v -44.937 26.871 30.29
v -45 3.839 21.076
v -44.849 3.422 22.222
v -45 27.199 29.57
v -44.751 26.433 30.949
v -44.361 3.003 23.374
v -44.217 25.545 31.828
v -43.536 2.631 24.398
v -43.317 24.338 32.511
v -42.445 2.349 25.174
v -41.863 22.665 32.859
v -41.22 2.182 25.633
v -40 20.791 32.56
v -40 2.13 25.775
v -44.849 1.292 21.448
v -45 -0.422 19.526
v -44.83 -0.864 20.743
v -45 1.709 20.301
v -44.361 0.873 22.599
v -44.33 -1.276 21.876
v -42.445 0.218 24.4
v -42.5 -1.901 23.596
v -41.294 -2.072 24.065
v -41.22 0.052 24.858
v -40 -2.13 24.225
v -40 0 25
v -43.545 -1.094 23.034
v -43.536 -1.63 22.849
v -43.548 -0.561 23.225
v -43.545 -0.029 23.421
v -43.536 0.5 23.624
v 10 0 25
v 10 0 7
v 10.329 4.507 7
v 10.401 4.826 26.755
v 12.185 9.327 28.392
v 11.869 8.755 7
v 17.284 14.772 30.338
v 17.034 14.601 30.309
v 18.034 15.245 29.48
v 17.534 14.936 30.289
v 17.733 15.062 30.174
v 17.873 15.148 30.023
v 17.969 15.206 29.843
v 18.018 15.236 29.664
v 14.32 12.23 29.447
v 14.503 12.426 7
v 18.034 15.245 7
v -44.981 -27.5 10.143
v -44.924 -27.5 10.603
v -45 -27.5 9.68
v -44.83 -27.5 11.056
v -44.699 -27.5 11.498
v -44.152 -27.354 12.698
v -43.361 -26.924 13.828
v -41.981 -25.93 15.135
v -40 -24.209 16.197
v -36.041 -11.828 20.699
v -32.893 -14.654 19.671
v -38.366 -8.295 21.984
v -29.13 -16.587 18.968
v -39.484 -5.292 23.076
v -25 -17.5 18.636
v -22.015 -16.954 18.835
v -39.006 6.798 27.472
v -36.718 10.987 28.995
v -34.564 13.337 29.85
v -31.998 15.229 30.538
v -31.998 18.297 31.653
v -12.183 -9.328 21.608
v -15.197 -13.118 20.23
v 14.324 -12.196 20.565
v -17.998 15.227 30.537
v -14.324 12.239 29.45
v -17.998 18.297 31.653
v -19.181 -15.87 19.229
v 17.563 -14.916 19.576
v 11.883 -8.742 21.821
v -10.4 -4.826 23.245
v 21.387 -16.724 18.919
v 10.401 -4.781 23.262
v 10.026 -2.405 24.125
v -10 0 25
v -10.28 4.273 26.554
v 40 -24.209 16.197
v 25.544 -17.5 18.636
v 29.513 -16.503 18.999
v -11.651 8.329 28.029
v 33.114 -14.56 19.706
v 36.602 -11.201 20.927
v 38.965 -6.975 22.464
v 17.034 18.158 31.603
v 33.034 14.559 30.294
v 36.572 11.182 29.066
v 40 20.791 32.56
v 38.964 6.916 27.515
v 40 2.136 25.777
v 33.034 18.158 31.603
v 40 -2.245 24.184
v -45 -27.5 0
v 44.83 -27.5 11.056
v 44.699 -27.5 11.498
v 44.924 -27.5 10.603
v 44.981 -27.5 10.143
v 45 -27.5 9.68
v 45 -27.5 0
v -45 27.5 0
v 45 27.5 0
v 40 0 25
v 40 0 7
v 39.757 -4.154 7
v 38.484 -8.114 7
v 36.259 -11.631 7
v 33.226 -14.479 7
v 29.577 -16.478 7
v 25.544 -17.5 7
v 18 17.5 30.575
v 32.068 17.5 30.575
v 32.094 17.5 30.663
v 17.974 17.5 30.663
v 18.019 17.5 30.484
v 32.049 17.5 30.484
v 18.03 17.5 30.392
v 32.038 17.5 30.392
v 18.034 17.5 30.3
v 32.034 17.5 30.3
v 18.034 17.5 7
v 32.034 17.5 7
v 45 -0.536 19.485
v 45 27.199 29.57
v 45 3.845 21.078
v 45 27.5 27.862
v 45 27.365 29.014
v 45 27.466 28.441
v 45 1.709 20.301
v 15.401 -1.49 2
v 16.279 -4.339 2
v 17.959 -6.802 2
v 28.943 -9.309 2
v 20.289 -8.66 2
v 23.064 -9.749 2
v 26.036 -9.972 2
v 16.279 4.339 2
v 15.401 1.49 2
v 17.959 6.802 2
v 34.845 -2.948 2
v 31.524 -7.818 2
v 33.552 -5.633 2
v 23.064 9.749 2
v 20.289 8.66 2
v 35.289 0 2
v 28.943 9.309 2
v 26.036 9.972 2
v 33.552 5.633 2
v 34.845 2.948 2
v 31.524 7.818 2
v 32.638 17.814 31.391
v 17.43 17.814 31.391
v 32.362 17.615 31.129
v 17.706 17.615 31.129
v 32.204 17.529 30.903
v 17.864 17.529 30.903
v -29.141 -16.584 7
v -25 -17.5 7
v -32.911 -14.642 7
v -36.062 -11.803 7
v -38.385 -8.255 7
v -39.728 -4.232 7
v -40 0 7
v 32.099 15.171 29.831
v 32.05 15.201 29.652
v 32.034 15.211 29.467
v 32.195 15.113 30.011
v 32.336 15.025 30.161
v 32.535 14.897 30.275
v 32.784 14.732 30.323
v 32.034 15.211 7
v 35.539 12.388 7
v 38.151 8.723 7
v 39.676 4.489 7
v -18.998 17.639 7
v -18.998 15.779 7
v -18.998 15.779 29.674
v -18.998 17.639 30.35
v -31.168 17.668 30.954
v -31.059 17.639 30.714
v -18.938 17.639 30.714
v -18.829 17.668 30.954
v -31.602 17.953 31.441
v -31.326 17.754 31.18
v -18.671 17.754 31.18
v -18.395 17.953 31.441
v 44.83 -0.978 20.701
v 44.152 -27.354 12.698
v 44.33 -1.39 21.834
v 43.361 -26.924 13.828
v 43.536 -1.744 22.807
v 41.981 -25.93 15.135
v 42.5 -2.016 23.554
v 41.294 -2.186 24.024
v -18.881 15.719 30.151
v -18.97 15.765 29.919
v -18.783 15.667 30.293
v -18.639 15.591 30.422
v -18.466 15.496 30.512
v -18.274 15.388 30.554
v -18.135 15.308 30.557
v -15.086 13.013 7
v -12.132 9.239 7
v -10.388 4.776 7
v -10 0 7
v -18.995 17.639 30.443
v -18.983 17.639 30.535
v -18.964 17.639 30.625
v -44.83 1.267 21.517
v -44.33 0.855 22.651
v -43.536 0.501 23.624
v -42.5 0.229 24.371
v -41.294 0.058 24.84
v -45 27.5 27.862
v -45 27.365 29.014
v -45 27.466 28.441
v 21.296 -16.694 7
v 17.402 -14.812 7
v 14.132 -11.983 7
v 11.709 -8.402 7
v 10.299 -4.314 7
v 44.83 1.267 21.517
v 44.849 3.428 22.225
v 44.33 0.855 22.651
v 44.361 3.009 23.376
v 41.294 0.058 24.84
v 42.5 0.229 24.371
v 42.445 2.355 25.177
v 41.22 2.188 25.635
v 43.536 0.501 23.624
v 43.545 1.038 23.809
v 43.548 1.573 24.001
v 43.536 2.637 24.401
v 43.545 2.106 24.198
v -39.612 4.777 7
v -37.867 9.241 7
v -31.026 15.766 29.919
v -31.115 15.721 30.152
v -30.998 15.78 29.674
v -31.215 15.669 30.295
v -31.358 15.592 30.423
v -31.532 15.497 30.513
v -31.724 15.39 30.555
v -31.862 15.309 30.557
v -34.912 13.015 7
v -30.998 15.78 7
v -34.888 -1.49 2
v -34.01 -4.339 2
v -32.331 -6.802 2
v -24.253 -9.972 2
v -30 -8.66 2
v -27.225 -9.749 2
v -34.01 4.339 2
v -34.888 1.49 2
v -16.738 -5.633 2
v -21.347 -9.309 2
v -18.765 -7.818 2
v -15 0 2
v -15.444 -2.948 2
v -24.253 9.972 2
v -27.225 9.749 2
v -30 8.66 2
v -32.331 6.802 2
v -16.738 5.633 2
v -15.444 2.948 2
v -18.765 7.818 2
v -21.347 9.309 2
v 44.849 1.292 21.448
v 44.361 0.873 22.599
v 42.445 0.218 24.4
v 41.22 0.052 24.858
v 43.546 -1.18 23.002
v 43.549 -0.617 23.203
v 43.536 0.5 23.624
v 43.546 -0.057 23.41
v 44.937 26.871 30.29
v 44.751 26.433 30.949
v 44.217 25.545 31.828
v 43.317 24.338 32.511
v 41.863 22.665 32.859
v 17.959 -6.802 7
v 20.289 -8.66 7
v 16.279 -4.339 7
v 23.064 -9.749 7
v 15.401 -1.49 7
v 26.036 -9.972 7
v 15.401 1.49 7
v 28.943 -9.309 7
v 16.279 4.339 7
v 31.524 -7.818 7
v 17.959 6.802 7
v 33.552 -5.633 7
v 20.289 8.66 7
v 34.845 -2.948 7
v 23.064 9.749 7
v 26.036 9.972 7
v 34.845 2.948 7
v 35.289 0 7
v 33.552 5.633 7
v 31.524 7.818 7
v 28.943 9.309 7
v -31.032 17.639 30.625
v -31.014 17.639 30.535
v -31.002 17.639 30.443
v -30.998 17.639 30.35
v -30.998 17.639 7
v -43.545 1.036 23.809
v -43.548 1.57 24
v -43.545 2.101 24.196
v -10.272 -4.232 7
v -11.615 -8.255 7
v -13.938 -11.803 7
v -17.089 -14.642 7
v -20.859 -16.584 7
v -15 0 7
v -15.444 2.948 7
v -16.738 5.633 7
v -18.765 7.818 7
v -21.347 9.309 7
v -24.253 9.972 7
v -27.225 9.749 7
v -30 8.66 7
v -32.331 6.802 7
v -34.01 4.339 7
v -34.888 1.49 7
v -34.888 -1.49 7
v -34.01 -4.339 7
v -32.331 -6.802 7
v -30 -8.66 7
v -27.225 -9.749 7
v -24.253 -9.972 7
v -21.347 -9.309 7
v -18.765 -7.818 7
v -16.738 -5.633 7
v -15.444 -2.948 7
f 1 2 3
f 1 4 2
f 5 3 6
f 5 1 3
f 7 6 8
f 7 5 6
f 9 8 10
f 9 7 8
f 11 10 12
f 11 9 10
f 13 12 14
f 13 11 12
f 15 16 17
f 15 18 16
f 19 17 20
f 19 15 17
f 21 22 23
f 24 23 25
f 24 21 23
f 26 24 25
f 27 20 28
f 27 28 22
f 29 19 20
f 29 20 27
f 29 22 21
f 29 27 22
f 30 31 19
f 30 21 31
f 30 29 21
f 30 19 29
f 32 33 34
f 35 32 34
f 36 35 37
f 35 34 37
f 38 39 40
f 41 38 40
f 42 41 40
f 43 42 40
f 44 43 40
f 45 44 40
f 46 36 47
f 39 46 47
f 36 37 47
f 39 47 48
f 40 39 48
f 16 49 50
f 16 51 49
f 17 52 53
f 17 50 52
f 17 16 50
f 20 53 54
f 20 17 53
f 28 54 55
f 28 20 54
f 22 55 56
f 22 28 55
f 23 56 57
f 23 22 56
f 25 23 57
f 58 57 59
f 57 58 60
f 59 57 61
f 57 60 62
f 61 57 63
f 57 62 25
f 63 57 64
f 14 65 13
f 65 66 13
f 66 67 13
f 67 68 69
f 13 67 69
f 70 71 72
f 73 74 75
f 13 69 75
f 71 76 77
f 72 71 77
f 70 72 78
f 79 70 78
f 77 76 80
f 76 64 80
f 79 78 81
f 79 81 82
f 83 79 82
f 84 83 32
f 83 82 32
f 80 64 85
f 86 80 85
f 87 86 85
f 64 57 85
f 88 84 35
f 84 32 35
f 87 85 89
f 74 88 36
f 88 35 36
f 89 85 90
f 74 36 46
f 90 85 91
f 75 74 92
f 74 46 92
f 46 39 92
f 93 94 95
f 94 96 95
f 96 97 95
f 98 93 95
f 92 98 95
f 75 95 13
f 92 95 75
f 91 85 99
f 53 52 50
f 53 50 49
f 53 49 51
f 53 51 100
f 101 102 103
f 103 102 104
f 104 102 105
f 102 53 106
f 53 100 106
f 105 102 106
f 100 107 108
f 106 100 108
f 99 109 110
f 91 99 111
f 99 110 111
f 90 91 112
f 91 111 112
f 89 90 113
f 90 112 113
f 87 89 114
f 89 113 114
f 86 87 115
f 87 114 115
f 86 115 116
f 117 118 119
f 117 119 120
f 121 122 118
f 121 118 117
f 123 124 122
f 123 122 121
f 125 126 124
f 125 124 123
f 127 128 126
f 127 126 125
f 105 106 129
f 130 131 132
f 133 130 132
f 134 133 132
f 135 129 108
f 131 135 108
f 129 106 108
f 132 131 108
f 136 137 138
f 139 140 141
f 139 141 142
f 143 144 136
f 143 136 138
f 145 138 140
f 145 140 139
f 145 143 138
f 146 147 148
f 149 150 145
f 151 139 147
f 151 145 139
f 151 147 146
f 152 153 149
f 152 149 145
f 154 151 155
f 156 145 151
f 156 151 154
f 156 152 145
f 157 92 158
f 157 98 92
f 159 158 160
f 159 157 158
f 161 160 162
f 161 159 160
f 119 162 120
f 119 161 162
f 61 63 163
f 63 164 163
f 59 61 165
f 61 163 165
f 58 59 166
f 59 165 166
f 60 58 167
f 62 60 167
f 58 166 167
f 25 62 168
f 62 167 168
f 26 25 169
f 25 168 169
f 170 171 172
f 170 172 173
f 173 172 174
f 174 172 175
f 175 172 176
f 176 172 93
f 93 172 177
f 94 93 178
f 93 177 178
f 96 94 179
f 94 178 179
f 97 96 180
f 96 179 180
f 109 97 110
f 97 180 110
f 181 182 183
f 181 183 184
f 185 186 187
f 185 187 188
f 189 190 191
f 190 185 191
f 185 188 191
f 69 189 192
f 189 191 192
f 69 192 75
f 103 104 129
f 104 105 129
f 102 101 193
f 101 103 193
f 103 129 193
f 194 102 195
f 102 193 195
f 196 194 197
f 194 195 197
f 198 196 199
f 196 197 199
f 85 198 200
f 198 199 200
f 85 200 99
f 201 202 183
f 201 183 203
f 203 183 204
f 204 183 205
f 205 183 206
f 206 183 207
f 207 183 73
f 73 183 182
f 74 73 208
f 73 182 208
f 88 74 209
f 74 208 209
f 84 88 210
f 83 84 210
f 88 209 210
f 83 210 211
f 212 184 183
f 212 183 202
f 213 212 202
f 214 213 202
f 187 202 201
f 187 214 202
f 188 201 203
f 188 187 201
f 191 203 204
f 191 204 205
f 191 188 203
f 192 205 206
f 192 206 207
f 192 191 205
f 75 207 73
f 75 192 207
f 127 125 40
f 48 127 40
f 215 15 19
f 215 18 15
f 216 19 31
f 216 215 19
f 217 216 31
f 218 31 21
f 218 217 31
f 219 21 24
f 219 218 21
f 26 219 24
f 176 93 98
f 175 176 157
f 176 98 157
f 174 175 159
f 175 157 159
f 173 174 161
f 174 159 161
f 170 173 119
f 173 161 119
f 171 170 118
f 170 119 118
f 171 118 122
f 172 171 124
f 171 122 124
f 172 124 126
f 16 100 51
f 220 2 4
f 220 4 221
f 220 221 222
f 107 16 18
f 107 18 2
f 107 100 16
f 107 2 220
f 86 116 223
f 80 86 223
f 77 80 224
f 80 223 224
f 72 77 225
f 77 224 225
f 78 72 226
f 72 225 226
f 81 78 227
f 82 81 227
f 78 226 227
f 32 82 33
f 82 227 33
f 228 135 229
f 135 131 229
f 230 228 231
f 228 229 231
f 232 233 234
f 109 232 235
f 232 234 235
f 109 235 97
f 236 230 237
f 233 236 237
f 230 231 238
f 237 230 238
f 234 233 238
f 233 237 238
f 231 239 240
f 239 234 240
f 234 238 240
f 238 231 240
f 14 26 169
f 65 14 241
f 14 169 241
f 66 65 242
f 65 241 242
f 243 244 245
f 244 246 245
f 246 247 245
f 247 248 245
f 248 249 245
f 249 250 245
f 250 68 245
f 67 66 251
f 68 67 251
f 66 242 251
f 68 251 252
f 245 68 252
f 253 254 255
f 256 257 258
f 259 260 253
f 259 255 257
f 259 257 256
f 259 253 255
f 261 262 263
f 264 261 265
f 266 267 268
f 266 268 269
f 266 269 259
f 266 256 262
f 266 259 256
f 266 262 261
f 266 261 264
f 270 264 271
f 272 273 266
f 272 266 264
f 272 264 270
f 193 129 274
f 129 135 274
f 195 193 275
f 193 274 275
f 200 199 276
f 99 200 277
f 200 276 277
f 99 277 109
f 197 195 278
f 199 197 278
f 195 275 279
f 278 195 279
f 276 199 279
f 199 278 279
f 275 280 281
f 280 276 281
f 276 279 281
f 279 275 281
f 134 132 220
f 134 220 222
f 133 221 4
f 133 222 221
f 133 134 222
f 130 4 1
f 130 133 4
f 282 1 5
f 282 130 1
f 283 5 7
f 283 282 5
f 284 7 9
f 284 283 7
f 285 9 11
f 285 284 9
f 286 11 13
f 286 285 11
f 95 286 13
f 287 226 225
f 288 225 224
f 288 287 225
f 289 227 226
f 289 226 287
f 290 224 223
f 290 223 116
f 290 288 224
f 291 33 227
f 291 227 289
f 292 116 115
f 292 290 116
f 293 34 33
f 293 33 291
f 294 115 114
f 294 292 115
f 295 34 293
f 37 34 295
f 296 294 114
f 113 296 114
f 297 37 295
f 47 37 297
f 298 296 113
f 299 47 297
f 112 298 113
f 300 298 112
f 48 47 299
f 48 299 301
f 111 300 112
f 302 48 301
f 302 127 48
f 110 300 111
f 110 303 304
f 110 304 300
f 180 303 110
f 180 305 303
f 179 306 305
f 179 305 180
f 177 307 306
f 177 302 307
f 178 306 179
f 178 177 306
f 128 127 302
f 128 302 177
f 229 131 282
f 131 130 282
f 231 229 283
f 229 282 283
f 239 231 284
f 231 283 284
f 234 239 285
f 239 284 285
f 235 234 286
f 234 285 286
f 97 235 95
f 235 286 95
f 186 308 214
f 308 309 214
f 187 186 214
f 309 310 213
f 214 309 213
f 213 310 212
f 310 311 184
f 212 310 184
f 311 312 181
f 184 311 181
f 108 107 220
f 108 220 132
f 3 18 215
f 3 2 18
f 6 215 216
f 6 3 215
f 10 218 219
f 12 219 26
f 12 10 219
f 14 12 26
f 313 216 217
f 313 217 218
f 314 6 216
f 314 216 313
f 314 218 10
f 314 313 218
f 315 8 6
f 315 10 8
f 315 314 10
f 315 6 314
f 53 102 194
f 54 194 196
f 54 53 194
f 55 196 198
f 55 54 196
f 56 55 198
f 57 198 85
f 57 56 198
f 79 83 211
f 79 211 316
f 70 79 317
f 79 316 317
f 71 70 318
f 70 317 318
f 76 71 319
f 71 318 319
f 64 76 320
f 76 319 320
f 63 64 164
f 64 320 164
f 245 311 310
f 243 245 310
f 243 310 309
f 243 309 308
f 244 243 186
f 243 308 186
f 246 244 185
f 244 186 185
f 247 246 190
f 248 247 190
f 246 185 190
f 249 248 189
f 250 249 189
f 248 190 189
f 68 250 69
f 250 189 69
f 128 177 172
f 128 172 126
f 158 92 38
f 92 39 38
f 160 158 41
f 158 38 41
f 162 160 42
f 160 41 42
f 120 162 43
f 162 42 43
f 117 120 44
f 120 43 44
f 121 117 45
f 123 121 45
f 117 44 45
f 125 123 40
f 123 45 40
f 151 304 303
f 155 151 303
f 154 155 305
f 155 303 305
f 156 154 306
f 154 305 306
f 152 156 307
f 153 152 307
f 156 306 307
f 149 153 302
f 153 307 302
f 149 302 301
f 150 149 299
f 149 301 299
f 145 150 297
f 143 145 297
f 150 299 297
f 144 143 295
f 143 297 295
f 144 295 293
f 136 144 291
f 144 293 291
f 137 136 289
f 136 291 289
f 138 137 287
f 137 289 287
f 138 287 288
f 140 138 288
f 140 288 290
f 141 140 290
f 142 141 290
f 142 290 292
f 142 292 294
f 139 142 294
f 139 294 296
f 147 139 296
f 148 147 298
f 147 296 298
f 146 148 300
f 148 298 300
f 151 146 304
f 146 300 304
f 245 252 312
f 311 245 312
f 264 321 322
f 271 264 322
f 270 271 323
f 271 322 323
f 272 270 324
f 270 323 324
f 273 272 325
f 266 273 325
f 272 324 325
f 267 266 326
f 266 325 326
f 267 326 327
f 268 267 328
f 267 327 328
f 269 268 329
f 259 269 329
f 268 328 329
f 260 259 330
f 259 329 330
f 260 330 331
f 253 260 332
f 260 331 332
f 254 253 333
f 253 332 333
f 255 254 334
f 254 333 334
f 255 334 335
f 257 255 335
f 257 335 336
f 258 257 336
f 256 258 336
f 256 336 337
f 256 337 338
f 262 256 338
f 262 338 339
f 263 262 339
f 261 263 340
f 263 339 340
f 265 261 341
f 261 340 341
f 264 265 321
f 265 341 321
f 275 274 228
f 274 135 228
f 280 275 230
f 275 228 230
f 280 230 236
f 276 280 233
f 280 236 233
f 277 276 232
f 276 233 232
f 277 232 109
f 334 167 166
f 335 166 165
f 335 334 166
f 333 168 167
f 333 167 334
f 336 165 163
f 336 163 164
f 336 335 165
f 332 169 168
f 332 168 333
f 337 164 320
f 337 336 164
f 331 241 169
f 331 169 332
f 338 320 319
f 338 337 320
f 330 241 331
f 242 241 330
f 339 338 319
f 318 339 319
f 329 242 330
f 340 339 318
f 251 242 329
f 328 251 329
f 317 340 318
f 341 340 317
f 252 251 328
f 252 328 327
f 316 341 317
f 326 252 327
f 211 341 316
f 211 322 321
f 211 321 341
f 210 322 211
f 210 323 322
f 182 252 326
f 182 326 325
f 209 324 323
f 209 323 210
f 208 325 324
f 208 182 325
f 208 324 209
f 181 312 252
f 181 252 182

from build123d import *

# Parameters (mm, degrees)
F0_W     = 90
F0_H     = 55
F1_DEPTH = 35
F2_DEPTH = 7
F3_R     = 10
F4_DEPTH = 5
F6_DEPTH = 90
F7_R     = 4.99999
F8_W     = 12
F8_H     = 3
F9_DEPTH = 30.7
F10_R    = 1


# Not quite as in the source:
# - a fillet or chamfer is up to 0.001 mm smaller than in the source, because OpenCascade refuses the exact size
# - a feature names something its author has since deleted; it is built from what else it names


with BuildPart() as f1:
    # F0 (on Top) → F1 (new body)
    with BuildSketch(Plane.XY):
        Rectangle(F0_W, F0_H)
        with BuildLine():
            ThreePointArc((-40, 0), (-36.0621543344, 11.8032751438), (-25, 17.5))
            ThreePointArc((-25, 17.5), (-13.9378456656, 11.8032751438), (-10, 0))
            ThreePointArc((-10, 0), (-13.9378456656, -11.8032751438), (-25, -17.5))
            ThreePointArc((-25, -17.5), (-36.0621543344, -11.8032751438), (-40, 0))
        make_face(mode=Mode.SUBTRACT)
        with BuildLine():
            ThreePointArc((10, 0), (13.9500894873, 11.8143319509), (25.0340790777, 17.5))
            ThreePointArc((25.0340790777, 17.5), (36.0744106495, 11.7922476991), (40, 0))
            ThreePointArc((40, 0), (36.2593265414, -11.6306402206), (25.5441482581, -17.5))
            ThreePointArc((25.5441482581, -17.5), (14.1318309156, -11.9833988689), (10, 0))
        make_face(mode=Mode.SUBTRACT)
    extrude(amount=F1_DEPTH)

    # F0 (on Top) → F2 (join)
    with BuildSketch(Plane.XY):
        with BuildLine():
            ThreePointArc((-10, 0), (-13.9378456656, 11.8032751438), (-25, 17.5))
            ThreePointArc((-25, 17.5), (-36.0621543344, 11.8032751438), (-40, 0))
            ThreePointArc((-40, 0), (-36.0621543344, -11.8032751438), (-25, -17.5))
            ThreePointArc((-25, -17.5), (-13.9378456656, -11.8032751438), (-10, 0))
        make_face()
        with BuildLine():
            ThreePointArc((40, 0), (36.0744106495, 11.7922476991), (25.0340790777, 17.5))
            ThreePointArc((25.0340790777, 17.5), (13.9500894873, 11.8143319509), (10, 0))
            ThreePointArc((10, 0), (14.1318309156, -11.9833988689), (25.5441482581, -17.5))
            ThreePointArc((25.5441482581, -17.5), (36.2593265414, -11.6306402206), (40, 0))
        make_face()
    extrude(amount=F2_DEPTH)

    # F3 (on face) → F4 (cut)
    with BuildSketch(Plane.XY.offset(7)):
        with Locations((-25, 0)):
            Circle(F3_R)
        with Locations((25.2891136679, 0)):
            Circle(F3_R)
    extrude(amount=-F4_DEPTH, mode=Mode.SUBTRACT)

    # F5 (on face) → F6 (cut)
    with BuildSketch(Plane.YZ.offset(45)):
        Polygon((-27.5, 15), (27.5, 35), (-27.5, 35), align=None)
    extrude(amount=-F6_DEPTH, mode=Mode.SUBTRACT)

    # F7 (radius 5 in the source; OpenCascade refuses exactly that, so slightly less here)
    f7_edges = [f1.edges().sort_by_distance(p)[0] for p in [
        (0, 27.5, 35),
        (-45, 0, 25),
        (0, -27.5, 15),
        (45, 0, 25),
    ]]
    fillet(f7_edges, radius=F7_R)

    # F8 (on face) → F9 (cut)
    with BuildSketch(Plane.XY.offset(7)):
        with Locations((-24.9983986142, 16.138614808)):
            Rectangle(F8_W, F8_H)
        Polygon((32.0340790777, 17.5), (25.0340790777, 17.5), (18.0340790777, 17.5), (18.0340790777, 14.5), (32.0340790777, 14.5), align=None)
    extrude(amount=F9_DEPTH, mode=Mode.SUBTRACT)

    # F10
    f10_edges = [f1.edges().sort_by_distance(p)[0] for p in [
        (-24.998399, 17.638615, 31.414042),
        (-30.998399, 16.709549, 31.0762),
        (-18.998399, 16.708736, 31.075904),
        (32.034079, 16.355367, 30.947406),
        (25.034079, 17.5, 31.363636),
        (18.034079, 16.372599, 30.953672),
    ]]
    fillet(f10_edges, radius=F10_R)


solid = f1.part
